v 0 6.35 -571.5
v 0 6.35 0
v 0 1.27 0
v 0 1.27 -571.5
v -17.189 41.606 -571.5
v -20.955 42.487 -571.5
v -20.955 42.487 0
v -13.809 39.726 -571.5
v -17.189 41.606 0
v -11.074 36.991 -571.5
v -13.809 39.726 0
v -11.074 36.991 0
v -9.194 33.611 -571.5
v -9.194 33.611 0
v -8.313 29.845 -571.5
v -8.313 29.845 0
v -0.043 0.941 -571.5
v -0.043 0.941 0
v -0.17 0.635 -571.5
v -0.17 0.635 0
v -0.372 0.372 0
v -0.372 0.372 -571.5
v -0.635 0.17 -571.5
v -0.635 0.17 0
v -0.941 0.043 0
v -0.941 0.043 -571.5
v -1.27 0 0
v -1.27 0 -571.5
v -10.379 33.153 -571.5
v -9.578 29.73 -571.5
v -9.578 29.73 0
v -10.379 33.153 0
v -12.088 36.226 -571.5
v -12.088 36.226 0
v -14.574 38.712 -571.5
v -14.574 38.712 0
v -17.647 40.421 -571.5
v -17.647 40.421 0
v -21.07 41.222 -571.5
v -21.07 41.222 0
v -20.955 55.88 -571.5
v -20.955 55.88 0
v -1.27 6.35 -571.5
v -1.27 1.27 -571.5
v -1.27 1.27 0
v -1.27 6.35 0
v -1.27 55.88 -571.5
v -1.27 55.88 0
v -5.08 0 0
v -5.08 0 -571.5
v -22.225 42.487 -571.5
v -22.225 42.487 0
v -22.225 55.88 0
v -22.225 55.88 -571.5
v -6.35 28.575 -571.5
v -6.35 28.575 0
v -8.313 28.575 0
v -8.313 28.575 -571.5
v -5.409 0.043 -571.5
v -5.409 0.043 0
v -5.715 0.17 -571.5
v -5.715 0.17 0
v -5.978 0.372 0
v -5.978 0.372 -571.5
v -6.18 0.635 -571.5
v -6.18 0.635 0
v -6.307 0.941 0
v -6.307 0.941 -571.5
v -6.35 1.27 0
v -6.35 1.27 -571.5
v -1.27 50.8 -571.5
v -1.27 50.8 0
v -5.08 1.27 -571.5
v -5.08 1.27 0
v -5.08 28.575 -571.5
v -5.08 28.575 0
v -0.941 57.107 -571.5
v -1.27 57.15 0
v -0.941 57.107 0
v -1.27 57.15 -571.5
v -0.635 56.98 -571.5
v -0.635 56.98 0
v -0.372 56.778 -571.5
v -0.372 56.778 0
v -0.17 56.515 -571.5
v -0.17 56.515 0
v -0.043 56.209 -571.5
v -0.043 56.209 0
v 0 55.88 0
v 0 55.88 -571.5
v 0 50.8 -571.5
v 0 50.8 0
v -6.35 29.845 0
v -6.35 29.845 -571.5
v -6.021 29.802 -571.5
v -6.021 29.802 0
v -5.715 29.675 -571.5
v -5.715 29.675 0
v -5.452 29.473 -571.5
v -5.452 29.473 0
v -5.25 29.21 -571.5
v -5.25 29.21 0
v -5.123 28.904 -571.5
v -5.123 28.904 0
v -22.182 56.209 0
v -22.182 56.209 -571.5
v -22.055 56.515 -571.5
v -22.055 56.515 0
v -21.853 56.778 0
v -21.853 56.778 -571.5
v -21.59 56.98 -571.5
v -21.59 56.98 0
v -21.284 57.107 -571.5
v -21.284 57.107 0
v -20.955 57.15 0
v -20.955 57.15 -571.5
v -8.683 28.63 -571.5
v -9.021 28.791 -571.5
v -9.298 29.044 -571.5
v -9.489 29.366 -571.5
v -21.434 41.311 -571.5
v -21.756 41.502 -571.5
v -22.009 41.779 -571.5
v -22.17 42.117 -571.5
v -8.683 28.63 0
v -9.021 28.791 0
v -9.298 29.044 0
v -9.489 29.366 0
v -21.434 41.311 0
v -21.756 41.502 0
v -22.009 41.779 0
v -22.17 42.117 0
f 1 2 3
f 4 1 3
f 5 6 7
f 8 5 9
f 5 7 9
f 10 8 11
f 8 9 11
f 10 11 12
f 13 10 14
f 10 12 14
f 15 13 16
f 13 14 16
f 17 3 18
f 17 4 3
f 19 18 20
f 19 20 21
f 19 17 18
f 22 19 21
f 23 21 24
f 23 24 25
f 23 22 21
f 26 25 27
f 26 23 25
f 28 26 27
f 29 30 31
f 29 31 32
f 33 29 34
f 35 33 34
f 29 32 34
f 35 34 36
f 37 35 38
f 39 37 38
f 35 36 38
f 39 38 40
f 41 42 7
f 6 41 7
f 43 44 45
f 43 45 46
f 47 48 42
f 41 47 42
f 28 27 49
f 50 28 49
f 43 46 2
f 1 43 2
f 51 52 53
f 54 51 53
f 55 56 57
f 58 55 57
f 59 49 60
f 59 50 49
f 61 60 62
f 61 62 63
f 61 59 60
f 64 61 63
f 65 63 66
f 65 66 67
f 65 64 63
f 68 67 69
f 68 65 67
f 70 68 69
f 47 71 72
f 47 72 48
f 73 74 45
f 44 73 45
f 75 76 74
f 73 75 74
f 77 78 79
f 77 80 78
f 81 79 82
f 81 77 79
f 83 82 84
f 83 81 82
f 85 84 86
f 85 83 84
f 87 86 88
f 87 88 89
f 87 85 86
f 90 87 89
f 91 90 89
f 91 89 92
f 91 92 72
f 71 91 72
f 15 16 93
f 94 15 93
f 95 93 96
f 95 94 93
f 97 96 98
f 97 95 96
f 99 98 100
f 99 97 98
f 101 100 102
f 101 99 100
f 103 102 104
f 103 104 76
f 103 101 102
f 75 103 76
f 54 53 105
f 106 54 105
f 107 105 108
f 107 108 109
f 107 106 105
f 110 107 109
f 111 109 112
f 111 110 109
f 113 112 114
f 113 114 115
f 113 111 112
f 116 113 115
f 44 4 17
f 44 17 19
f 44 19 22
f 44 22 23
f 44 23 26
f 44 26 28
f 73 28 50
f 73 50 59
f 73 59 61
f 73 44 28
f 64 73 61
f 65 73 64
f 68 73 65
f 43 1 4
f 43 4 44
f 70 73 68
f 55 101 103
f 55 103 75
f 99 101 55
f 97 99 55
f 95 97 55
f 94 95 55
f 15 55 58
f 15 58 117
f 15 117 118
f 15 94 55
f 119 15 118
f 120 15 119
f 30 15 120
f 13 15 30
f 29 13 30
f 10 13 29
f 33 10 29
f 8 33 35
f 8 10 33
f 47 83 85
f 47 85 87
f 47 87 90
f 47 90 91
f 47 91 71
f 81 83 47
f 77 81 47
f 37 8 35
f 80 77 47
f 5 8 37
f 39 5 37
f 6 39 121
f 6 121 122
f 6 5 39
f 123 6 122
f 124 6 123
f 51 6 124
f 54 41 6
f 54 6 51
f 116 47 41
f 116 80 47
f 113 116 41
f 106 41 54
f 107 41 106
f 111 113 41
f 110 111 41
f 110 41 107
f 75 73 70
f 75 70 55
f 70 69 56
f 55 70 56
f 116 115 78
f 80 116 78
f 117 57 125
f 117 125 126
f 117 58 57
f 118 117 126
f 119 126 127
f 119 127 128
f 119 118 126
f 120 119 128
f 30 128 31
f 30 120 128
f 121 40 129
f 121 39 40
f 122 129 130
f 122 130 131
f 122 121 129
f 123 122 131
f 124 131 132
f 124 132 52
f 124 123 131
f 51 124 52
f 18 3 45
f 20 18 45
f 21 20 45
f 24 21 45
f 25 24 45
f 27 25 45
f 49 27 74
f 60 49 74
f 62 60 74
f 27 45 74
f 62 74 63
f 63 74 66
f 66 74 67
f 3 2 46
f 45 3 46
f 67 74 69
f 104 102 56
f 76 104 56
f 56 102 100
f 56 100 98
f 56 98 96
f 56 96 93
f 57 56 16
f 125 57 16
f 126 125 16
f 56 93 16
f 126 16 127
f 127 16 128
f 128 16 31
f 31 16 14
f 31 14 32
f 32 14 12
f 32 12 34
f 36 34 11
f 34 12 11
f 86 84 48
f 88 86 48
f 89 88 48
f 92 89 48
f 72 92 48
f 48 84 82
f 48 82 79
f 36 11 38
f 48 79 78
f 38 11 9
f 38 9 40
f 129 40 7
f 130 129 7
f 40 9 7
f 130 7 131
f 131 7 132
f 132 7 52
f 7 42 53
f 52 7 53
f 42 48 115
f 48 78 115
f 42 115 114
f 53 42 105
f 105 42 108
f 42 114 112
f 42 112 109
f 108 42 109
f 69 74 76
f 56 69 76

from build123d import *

# Parameters (mm, degrees)
EXTRUDE_THIN1_DEPTH = 571.5
FILLET1_R           = 1.27


with BuildPart() as part:
    # Sketch1 → Extrude-Thin1 (new body)
    with BuildSketch(Plane.XY):
        with BuildLine():
            Line((0, 6.35), (0, 0))
            Line((0, 0), (-6.35, 0))
            Line((-6.35, 0), (-6.35, 28.575))
            Line((-6.35, 28.575), (-9.525, 28.575))
            ThreePointArc((-9.525, 28.575), (-13.244743879, 37.555256121), (-22.225, 41.275))
            Line((-22.225, 41.275), (-22.225, 57.15))
            Line((-22.225, 57.15), (0, 57.15))
            Line((0, 57.15), (0, 50.8))
            Line((0, 50.8), (-1.27, 50.8))
            Line((-1.27, 50.8), (-1.27, 55.88))
            Line((-1.27, 55.88), (-20.955, 55.88))
            Line((-20.955, 55.88), (-20.955, 42.487152961))
            ThreePointArc((-20.955, 42.487152961), (-12.346718267, 38.453281733), (-8.312847039, 29.845))
            Line((-8.312847039, 29.845), (-5.08, 29.845))
            Line((-5.08, 29.845), (-5.08, 1.27))
            Line((-5.08, 1.27), (-1.27, 1.27))
            Line((-1.27, 1.27), (-1.27, 6.35))
            Line((-1.27, 6.35), (0, 6.35))
        make_face()
    extrude(amount=-EXTRUDE_THIN1_DEPTH)

    # Fillet1
    fillet1_edges = [part.edges().sort_by_distance(p)[0] for p in [
        (-5.08, 29.845, -285.75),
        (0, 0, -285.75),
        (-6.35, 0, -285.75),
        (-9.525, 28.575, -285.75),
        (-22.225, 41.275, -285.75),
        (-22.225, 57.15, -285.75),
        (0, 57.15, -285.75),
    ]]
    fillet(fillet1_edges, radius=FILLET1_R)


solid = part.part
